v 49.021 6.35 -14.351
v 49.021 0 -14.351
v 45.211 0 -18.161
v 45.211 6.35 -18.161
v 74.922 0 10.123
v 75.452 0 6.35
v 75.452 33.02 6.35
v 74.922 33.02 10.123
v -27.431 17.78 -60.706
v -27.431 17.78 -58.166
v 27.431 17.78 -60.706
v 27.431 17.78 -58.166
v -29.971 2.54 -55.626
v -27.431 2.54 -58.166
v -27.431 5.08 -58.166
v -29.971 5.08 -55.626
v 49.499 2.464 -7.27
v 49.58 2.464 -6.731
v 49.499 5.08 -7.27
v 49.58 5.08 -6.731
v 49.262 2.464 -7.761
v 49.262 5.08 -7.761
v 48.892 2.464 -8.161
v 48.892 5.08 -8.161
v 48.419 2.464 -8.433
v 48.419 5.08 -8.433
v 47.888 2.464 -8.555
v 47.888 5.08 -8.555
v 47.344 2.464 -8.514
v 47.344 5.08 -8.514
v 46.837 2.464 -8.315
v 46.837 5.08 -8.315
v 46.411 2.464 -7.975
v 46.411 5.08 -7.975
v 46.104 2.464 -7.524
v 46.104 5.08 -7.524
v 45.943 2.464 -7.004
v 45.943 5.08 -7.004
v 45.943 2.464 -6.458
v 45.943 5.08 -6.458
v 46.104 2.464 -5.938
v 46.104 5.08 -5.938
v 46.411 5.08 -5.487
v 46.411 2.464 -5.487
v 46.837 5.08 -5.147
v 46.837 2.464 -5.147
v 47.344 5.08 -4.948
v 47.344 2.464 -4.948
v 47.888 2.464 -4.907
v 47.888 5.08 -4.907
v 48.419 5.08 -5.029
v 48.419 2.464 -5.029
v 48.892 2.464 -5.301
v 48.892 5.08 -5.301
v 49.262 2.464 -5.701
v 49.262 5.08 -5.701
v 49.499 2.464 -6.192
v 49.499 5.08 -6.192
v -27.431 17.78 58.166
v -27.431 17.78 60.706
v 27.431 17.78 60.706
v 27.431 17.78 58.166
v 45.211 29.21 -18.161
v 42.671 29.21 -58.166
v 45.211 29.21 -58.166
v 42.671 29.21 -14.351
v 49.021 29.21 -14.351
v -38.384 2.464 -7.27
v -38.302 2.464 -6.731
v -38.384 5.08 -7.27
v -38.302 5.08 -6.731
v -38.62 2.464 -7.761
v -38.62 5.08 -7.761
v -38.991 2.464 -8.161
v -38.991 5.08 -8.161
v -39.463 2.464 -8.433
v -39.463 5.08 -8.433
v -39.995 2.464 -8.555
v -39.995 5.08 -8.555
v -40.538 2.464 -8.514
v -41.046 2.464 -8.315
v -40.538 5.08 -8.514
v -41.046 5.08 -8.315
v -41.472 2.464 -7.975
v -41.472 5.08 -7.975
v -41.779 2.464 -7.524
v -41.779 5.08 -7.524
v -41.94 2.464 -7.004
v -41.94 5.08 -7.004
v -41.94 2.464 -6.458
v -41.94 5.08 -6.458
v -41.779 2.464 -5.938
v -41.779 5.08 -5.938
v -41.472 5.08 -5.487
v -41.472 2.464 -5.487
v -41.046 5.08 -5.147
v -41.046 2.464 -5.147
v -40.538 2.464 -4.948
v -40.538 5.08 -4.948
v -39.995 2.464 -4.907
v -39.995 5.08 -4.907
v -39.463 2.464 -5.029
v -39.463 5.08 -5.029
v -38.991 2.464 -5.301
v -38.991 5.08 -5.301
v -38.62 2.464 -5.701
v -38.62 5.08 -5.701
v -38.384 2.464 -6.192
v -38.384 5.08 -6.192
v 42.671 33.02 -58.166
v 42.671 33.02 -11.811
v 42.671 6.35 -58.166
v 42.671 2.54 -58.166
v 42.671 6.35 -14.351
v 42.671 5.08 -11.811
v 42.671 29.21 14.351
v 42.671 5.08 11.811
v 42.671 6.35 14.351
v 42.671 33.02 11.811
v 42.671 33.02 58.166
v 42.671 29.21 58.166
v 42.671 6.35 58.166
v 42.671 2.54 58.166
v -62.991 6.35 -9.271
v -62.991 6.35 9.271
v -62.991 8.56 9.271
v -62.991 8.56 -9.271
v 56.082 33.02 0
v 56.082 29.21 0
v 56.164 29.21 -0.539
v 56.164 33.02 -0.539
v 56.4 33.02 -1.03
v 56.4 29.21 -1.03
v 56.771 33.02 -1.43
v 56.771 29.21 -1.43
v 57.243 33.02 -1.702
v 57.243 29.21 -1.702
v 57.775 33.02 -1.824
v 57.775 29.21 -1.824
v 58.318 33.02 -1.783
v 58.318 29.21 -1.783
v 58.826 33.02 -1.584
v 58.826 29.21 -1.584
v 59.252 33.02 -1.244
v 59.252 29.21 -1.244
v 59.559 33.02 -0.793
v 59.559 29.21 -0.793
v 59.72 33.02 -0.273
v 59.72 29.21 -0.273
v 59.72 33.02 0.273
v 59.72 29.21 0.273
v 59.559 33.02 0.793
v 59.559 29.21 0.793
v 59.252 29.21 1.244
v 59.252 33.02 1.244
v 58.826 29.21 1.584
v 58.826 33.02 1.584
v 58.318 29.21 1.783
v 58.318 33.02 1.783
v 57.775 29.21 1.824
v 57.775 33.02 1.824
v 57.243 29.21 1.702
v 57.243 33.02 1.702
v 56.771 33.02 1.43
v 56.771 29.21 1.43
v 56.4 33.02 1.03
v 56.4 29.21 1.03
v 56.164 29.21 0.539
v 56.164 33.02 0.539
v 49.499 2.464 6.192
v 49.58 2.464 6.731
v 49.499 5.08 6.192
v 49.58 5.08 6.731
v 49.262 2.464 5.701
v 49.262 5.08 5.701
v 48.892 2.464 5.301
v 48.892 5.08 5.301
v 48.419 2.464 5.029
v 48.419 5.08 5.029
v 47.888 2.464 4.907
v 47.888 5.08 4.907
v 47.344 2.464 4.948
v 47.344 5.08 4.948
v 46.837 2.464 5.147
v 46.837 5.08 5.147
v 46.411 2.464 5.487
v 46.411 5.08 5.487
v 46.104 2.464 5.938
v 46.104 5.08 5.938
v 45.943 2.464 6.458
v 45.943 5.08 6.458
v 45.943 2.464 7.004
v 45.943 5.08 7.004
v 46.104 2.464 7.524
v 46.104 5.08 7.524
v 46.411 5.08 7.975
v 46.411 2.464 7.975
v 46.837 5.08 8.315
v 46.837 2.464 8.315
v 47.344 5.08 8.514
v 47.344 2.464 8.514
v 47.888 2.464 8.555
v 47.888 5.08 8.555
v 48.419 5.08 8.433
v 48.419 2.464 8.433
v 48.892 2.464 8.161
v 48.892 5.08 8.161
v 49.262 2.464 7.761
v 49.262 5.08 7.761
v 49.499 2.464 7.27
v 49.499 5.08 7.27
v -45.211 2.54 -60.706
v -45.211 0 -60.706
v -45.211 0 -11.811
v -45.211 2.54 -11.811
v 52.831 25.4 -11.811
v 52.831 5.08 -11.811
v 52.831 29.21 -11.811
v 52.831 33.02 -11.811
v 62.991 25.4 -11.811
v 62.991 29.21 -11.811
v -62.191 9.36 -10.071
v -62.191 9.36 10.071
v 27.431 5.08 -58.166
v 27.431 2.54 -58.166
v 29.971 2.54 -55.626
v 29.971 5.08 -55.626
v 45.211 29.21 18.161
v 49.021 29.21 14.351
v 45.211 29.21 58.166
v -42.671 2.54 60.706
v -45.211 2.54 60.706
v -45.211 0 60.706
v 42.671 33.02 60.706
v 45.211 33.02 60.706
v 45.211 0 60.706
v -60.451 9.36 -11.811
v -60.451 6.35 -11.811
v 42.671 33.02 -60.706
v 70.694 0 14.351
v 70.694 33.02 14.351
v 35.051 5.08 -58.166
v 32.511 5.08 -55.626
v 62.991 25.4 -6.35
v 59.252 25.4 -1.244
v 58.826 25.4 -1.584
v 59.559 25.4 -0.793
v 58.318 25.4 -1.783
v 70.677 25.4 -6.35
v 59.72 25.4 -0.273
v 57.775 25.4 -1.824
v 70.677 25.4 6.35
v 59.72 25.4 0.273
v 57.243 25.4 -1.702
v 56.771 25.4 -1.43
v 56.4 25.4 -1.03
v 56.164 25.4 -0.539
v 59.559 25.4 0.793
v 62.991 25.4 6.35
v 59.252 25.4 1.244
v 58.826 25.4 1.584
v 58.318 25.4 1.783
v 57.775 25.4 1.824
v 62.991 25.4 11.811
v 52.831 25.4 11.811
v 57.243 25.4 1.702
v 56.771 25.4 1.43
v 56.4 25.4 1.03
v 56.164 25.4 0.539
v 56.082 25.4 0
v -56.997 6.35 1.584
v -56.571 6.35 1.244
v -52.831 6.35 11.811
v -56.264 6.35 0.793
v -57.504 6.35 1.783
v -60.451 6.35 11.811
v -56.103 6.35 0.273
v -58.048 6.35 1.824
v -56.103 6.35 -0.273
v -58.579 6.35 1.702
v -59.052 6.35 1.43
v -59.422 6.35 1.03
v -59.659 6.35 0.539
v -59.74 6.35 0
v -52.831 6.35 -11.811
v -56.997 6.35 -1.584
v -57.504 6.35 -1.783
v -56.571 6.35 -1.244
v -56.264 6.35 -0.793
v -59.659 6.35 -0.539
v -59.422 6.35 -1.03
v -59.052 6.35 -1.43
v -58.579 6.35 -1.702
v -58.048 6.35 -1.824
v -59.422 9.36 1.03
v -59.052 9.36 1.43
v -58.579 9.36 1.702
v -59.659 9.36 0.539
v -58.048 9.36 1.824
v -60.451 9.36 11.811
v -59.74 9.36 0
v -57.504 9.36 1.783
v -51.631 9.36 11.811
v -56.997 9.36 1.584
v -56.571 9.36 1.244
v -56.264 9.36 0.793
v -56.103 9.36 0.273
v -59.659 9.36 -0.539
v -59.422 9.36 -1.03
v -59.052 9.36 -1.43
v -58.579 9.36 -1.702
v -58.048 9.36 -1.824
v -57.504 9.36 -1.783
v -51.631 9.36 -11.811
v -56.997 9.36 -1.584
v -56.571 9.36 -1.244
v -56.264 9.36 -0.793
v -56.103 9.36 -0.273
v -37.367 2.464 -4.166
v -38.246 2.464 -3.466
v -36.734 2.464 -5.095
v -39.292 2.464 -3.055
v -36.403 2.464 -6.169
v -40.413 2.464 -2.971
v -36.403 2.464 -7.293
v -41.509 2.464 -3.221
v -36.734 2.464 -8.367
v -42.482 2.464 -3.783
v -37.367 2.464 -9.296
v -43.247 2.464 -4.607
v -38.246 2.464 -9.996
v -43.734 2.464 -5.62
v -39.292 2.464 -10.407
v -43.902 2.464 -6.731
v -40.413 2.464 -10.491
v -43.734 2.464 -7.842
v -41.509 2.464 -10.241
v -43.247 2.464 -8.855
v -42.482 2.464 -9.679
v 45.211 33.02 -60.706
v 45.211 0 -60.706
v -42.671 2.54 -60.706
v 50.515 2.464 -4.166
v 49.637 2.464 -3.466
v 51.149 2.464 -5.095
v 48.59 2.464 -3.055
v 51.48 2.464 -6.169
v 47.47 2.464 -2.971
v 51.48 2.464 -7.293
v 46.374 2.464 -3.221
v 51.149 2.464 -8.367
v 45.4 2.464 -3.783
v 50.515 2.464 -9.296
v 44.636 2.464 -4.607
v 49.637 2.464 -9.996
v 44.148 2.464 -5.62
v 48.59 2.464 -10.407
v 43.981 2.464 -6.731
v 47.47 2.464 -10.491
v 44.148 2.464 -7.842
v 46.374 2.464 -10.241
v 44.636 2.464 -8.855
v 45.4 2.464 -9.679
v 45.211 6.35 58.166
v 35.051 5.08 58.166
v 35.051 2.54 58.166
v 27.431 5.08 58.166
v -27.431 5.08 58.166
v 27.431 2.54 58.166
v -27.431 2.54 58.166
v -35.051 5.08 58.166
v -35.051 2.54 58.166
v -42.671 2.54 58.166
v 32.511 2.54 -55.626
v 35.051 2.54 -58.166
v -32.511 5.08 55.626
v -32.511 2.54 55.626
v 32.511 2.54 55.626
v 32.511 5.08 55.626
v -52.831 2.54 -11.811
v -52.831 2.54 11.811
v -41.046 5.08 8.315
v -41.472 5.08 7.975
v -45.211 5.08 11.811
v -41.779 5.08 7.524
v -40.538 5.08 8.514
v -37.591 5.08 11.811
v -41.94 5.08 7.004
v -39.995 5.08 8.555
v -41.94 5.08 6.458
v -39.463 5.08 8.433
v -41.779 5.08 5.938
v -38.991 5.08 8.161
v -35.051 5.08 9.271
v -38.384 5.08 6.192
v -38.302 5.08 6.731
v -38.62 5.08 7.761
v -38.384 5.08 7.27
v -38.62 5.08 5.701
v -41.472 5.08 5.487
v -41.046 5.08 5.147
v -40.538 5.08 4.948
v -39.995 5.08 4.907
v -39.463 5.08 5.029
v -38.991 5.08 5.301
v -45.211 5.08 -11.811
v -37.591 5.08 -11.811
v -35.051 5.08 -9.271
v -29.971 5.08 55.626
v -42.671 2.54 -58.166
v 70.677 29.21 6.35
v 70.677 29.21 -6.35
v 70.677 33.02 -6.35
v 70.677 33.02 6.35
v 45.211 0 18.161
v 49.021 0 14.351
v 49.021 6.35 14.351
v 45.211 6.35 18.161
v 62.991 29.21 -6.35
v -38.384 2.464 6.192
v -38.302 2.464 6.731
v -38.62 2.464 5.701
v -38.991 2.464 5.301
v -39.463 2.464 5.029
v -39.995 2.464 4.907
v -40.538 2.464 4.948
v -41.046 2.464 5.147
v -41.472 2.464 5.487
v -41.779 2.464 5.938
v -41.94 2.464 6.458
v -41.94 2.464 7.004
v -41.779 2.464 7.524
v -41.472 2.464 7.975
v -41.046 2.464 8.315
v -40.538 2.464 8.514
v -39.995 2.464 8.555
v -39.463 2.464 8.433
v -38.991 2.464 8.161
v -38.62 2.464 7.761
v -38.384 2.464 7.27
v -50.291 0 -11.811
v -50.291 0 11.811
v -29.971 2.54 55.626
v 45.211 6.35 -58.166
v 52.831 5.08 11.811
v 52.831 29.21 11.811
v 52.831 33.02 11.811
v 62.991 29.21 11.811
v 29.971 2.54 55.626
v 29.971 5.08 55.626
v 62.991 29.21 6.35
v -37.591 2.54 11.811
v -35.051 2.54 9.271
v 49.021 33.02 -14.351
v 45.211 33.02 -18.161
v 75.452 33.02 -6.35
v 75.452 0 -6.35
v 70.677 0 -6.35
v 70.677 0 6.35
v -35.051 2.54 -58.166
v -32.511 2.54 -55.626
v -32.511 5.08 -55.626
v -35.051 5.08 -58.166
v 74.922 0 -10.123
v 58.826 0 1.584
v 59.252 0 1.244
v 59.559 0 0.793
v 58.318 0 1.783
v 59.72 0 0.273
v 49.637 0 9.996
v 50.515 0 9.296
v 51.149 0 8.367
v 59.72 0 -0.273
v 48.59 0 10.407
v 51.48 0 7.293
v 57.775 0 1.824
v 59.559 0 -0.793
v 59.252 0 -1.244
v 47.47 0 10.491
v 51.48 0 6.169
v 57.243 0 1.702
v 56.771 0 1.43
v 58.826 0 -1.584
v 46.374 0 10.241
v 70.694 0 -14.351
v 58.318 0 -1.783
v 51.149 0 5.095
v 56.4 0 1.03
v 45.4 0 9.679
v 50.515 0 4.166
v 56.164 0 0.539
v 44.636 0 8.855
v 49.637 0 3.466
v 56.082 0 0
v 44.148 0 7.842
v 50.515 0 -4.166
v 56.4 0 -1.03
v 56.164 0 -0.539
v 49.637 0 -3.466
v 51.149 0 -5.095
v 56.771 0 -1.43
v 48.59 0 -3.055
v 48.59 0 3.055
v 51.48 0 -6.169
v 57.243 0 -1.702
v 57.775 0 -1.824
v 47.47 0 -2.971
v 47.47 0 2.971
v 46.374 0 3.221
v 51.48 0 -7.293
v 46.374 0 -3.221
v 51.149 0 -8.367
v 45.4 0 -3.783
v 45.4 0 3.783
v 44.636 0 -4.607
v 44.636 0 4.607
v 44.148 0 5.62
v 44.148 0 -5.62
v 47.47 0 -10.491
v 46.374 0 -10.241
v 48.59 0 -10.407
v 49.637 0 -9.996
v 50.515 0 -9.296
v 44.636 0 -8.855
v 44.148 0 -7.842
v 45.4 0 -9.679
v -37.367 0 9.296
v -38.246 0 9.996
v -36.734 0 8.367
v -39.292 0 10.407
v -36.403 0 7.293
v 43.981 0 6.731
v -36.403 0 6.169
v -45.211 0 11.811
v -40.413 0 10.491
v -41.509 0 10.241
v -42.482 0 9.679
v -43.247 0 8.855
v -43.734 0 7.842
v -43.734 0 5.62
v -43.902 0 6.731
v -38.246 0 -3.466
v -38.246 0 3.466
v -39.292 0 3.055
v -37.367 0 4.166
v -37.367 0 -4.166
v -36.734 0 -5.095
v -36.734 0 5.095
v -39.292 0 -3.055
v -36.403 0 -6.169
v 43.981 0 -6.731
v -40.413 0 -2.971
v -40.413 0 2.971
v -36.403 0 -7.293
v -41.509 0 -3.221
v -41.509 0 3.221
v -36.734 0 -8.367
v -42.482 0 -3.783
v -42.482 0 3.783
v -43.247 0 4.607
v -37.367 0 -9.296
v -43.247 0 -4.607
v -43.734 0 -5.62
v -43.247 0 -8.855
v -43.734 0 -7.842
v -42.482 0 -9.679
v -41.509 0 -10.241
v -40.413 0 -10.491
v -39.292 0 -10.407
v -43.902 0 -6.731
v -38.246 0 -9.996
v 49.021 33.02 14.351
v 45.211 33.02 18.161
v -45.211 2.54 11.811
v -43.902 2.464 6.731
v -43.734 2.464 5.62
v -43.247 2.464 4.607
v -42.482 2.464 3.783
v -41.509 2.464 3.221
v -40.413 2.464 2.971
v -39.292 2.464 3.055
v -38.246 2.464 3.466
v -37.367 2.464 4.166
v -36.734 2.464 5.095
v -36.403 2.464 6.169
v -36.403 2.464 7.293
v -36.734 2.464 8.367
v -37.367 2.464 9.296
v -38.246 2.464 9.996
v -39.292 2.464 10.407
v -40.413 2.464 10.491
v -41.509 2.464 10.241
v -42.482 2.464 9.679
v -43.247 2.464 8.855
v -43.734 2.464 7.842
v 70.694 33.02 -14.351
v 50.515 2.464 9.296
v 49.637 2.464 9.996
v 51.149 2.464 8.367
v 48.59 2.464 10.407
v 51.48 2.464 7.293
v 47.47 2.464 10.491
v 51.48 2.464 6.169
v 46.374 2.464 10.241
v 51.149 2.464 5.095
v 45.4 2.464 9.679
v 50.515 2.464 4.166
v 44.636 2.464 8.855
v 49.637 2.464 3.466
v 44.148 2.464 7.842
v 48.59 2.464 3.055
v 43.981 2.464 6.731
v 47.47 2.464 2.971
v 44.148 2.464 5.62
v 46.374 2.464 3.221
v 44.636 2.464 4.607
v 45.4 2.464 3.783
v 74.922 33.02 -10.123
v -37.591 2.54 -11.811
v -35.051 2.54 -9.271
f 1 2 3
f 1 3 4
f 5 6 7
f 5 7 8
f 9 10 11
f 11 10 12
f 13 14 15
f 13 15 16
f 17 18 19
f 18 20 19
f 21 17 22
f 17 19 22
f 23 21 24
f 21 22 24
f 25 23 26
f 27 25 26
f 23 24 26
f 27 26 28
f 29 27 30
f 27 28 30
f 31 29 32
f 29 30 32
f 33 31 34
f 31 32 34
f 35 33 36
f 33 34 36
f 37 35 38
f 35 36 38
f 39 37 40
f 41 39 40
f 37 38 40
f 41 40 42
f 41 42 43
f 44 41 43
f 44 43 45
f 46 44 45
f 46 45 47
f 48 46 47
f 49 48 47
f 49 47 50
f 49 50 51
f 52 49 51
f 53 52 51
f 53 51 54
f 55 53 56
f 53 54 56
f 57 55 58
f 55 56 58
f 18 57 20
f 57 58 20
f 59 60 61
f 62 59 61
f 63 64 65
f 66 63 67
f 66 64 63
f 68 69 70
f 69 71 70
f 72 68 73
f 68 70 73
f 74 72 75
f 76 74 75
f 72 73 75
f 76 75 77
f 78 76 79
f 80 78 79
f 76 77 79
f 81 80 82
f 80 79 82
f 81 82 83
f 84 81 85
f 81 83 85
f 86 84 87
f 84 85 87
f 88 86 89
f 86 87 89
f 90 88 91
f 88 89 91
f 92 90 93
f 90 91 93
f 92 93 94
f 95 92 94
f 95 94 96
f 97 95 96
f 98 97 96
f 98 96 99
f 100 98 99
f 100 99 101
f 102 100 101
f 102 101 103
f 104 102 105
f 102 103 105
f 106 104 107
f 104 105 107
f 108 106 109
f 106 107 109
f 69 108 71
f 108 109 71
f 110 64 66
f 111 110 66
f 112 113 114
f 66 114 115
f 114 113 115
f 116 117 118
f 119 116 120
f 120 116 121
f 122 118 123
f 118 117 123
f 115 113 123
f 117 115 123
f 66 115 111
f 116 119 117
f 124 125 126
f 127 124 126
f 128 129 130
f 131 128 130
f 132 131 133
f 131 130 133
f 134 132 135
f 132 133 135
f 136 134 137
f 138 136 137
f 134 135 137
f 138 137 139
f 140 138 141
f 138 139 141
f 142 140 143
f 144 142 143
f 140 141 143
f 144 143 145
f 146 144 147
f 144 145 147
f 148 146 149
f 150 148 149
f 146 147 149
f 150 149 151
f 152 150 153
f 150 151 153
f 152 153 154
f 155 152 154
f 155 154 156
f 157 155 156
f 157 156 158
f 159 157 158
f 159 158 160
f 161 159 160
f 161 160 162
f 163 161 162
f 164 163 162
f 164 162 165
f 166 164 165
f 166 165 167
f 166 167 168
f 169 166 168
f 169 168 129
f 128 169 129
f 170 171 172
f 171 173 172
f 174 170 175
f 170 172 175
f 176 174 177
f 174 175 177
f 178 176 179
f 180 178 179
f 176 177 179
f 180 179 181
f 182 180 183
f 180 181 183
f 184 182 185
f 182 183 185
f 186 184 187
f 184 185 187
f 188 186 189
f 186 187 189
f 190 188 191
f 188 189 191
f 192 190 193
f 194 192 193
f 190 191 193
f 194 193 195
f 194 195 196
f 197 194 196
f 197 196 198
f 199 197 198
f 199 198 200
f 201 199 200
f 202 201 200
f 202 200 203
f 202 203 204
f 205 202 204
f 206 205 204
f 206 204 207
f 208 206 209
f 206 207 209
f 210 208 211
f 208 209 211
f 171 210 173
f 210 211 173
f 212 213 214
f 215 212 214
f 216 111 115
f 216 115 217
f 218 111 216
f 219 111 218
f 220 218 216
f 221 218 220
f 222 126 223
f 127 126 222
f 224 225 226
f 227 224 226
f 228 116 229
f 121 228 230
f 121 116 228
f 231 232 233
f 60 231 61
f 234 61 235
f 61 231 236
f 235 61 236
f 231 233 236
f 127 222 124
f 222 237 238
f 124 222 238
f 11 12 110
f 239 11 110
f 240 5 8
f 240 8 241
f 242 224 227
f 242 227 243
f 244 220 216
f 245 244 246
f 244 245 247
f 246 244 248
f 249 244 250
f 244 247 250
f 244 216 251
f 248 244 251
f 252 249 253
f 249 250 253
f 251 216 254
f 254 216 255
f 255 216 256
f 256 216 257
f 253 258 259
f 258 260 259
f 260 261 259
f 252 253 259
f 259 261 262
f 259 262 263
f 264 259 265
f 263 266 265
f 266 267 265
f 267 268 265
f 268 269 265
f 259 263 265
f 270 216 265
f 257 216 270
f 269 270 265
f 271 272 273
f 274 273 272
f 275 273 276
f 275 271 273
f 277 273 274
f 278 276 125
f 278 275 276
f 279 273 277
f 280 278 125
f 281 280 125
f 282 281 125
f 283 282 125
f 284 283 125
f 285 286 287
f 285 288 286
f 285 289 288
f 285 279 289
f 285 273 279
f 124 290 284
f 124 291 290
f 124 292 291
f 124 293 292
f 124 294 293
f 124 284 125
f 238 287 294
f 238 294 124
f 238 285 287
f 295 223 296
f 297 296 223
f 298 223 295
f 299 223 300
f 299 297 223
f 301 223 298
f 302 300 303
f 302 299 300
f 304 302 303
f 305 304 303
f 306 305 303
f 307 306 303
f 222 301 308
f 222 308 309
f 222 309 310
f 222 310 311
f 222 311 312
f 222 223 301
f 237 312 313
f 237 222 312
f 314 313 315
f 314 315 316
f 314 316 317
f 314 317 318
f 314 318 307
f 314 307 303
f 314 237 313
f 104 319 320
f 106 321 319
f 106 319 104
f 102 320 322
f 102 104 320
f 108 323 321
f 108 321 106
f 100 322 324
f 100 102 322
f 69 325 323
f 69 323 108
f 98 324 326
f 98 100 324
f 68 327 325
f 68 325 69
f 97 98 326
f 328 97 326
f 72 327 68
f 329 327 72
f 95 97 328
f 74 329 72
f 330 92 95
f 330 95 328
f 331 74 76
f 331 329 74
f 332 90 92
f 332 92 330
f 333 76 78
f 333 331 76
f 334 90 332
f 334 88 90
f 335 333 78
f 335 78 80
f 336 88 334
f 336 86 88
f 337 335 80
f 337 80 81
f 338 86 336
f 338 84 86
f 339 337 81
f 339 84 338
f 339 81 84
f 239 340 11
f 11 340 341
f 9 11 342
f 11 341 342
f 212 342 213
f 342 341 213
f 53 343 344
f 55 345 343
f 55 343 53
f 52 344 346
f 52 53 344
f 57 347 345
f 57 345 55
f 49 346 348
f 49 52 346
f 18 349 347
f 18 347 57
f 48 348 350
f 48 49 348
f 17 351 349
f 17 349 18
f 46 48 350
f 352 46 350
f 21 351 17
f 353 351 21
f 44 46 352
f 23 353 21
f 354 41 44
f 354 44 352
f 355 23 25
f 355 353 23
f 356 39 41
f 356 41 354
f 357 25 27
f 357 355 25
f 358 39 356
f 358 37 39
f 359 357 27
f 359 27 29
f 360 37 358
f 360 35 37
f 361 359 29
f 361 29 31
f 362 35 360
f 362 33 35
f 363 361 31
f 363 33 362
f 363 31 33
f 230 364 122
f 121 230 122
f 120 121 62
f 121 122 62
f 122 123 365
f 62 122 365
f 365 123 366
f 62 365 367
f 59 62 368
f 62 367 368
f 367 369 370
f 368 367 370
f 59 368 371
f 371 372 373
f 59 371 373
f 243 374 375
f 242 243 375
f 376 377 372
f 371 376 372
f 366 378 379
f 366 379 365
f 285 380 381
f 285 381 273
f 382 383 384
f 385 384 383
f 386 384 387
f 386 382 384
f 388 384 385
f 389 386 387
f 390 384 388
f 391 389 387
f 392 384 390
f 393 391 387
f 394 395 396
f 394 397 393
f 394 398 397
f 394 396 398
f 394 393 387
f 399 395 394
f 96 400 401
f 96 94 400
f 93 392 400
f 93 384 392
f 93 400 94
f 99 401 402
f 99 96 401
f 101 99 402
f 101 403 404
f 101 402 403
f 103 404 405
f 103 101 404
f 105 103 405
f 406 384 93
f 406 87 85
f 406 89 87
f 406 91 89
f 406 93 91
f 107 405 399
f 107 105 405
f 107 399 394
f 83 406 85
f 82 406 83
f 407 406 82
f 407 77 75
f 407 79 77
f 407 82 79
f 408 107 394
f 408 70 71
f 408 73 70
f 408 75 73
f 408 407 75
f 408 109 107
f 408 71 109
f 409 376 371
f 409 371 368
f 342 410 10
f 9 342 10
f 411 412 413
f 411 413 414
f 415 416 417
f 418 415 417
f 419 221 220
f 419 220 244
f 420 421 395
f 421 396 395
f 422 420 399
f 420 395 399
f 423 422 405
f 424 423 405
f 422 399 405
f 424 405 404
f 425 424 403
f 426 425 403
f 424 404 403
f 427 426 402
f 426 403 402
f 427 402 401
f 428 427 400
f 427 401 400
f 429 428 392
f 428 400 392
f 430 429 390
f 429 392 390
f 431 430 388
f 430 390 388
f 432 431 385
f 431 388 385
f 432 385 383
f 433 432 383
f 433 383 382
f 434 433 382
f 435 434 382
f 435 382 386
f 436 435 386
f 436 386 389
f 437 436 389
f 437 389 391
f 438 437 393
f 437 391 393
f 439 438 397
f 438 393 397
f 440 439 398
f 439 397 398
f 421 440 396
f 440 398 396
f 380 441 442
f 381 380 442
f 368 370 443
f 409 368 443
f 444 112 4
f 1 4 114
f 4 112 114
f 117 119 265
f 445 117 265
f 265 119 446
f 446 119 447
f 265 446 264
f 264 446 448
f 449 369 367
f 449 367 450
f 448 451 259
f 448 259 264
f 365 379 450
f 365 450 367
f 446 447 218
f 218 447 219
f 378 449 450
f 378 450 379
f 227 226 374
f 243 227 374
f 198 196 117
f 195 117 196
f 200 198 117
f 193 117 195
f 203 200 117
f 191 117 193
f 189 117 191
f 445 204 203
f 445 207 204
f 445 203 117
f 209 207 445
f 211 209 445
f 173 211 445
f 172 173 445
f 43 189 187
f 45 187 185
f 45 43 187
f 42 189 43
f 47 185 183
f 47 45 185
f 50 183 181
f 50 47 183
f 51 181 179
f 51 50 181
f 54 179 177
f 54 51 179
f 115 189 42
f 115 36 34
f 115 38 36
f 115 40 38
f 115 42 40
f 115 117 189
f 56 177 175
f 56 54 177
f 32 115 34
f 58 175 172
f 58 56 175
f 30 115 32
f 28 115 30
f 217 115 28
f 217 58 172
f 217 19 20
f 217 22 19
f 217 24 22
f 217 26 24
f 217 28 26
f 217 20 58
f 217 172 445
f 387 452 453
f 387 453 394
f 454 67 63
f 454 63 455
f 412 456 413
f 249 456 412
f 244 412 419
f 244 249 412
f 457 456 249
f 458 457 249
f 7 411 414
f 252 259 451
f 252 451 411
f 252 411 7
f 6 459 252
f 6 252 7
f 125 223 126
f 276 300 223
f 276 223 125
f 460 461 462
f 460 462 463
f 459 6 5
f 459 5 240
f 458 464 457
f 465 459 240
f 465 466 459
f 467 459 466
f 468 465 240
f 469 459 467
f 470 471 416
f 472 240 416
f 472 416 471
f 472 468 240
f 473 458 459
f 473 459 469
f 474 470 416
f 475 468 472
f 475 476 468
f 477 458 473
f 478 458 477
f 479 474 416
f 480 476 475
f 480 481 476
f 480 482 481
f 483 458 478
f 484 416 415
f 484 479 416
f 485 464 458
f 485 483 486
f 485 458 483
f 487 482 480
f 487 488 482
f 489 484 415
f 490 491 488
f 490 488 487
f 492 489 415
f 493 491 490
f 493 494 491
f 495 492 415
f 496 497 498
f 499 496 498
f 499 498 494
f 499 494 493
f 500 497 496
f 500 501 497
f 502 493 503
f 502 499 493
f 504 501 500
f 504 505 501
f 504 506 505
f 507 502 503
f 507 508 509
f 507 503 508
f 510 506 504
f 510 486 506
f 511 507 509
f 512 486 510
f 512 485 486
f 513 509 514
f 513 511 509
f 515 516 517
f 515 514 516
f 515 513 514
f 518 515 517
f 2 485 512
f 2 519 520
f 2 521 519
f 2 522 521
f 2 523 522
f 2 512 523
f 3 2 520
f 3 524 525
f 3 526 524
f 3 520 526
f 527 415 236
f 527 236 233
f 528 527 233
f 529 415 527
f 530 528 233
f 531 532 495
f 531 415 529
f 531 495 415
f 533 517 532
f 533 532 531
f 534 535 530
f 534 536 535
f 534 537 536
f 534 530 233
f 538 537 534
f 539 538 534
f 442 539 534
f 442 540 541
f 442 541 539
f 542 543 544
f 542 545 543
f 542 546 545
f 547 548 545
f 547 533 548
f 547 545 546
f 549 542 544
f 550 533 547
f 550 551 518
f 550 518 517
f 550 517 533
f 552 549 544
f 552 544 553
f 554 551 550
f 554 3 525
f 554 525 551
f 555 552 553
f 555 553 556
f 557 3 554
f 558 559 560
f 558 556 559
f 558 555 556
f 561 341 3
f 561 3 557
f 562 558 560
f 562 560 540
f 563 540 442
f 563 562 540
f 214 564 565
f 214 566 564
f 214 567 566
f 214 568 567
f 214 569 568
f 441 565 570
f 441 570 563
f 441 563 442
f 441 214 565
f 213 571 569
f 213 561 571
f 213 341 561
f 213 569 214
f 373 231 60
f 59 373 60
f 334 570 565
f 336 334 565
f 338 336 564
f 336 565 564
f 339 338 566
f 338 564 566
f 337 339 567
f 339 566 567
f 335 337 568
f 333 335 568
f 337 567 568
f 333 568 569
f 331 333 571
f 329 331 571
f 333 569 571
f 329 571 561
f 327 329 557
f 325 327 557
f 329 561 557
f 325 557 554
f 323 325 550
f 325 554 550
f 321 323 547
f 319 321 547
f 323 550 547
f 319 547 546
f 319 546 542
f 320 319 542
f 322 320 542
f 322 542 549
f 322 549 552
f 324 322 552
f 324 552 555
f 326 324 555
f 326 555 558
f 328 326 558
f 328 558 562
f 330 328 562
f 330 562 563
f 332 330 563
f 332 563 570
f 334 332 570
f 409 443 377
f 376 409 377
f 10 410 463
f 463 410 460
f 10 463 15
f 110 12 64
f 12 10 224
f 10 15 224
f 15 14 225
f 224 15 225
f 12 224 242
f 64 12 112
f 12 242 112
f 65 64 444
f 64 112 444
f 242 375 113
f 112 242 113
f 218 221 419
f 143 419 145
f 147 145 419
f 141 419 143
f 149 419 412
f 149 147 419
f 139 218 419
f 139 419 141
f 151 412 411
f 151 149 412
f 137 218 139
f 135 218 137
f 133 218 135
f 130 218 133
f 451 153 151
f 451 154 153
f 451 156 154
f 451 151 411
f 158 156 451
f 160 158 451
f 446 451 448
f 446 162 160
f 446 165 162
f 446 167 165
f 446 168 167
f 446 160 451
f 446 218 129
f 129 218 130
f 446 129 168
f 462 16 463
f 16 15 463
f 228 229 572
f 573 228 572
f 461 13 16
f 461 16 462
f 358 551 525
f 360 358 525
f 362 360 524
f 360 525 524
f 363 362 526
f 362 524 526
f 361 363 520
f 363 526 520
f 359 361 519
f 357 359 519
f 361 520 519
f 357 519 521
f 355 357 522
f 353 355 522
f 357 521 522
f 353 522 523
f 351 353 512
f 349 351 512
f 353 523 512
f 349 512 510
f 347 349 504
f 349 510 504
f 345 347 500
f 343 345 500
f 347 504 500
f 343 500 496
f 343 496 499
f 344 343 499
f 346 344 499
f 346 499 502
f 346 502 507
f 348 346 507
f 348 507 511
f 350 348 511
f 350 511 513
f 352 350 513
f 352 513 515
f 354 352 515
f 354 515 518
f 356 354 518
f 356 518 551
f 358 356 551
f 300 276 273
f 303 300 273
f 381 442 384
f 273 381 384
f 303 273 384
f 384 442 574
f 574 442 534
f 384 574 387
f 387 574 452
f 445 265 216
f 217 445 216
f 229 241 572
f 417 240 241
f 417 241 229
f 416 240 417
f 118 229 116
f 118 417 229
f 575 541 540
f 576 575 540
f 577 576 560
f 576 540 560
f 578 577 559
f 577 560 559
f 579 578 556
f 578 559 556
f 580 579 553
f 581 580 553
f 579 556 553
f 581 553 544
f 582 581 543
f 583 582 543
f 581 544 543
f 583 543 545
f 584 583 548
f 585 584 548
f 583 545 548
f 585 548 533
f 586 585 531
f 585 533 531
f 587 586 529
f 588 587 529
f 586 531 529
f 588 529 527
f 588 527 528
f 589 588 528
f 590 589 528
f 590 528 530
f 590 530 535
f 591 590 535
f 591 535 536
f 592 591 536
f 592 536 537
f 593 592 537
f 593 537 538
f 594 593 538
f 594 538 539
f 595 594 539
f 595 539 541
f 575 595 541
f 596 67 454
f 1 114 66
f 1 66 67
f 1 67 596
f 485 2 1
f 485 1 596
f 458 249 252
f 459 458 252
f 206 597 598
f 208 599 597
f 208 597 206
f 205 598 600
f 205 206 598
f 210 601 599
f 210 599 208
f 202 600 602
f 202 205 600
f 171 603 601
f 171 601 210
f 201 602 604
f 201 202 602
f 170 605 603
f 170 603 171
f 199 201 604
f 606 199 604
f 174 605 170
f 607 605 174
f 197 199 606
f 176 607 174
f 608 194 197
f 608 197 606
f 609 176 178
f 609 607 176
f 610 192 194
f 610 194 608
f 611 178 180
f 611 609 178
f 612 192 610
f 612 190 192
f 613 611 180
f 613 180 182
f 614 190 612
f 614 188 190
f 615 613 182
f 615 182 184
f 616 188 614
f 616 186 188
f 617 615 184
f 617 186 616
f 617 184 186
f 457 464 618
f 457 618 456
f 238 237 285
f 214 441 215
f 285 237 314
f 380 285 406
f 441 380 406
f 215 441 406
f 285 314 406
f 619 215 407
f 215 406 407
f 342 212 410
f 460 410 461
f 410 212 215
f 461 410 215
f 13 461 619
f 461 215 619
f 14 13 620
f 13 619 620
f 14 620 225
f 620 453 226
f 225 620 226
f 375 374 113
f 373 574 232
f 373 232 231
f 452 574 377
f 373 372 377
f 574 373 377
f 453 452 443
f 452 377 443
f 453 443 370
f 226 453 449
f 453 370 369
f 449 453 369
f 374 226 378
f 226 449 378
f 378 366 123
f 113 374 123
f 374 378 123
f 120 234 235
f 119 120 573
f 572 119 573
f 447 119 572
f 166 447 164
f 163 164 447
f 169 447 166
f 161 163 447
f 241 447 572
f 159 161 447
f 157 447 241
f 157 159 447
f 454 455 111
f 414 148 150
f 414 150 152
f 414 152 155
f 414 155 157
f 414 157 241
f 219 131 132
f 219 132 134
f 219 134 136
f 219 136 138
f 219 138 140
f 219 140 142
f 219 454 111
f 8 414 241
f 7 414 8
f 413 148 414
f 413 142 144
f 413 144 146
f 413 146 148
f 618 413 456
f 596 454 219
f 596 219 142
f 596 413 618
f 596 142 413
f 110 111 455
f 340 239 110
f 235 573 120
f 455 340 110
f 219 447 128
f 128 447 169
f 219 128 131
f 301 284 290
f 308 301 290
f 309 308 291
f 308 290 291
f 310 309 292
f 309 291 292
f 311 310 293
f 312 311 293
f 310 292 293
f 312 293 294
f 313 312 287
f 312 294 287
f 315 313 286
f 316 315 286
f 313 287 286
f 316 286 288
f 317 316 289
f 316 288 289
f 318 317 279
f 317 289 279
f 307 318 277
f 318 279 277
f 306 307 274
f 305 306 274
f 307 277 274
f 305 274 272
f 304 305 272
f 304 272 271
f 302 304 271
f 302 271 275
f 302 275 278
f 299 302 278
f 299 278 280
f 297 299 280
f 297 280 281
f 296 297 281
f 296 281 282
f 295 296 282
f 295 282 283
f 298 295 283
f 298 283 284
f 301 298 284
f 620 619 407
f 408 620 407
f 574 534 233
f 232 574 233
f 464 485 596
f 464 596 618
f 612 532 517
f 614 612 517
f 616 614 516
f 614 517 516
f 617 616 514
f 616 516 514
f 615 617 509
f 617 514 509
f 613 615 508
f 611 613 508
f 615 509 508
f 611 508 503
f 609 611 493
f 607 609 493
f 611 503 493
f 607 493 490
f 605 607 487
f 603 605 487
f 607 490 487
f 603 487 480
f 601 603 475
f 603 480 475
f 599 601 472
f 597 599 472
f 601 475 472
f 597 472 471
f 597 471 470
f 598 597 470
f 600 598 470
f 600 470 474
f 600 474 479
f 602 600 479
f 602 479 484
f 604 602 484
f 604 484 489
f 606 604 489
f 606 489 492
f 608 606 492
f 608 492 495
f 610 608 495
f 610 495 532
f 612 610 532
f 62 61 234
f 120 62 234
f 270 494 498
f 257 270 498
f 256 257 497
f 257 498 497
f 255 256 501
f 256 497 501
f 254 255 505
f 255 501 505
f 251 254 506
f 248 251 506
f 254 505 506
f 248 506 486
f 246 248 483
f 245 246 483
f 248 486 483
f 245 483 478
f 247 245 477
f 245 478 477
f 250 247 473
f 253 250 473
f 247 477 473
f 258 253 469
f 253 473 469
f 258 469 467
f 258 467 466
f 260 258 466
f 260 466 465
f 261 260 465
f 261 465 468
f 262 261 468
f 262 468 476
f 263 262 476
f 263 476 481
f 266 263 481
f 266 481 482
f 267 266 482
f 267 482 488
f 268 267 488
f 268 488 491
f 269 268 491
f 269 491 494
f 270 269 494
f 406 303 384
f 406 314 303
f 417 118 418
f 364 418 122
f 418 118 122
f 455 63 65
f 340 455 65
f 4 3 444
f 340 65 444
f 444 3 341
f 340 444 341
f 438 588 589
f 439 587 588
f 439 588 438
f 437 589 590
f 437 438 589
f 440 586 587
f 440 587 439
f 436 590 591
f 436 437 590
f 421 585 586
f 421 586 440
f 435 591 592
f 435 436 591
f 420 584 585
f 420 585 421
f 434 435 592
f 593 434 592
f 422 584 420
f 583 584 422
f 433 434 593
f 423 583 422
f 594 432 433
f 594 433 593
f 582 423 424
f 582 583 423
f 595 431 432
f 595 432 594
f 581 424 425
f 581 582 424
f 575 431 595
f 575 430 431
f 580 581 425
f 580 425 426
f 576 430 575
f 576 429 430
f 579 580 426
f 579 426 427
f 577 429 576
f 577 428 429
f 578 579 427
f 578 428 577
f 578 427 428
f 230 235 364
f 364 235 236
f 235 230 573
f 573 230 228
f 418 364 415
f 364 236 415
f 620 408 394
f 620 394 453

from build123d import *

# Parameters (mm, degrees)
SKETCH3_W                                       = 90.422573022
SKETCH3_H                                       = 121.412
BOSS_EXTRUDE4_DEPTH                             = 2.54
BOSS_EXTRUDE5_DEPTH                             = 30.48
CUT_EXTRUDE2_DEPTH                              = 122.412
BOSS_EXTRUDE6_DEPTH                             = 33.02
SKETCH9_W                                       = 10.16
SKETCH9_H                                       = 23.622
CUT_EXTRUDE3_DEPTH                              = 27.94
BOSS_EXTRUDE7_DEPTH                             = 2.54
SKETCH12_W                                      = 23.622
SKETCH12_H                                      = 3.81
CUT_EXTRUDE4_DEPTH                              = 10.16
SKETCH13_W                                      = 12.7
SKETCH13_H                                      = 3.81
CUT_EXTRUDE5_DEPTH                              = 13.461069207
BOSS_EXTRUDE9_REACH                             = 62.706
BOSS_EXTRUDE9_DIRECTION_2_REACH                 = 62.706
CBORE_FOR_6_PAN_HEAD_MACHINE_SCREW1_D           = 3.6576
CBORE_FOR_6_PAN_HEAD_MACHINE_SCREW1_CBORE_D     = 7.54126
CBORE_FOR_6_PAN_HEAD_MACHINE_SCREW1_CBORE_DEPTH = 2.4638
F_6_CLEARANCE_HOLE1_D                           = 3.6576
SKETCH21_W                                      = 43.815
SKETCH21_H                                      = 22.86
CUT_EXTRUDE6_DEPTH                              = 33.781069207
CHAMFER1_SIZE                                   = 2.54
CHAMFER2_SIZE                                   = 3.81
SKETCH22_W                                      = 17.78
SKETCH22_H                                      = 23.622
CUT_EXTRUDE7_DEPTH                              = 0.8
CHAMFER3_SIZE                                   = 0.8


with BuildPart() as part:
    # Sketch3 → Boss-Extrude4 (new body)
    with BuildSketch(Plane(origin=(0, 0, 0), x_dir=(1, 0, 0), z_dir=(0, 1, 0))):
        Rectangle(SKETCH3_W, SKETCH3_H)
    extrude(amount=BOSS_EXTRUDE4_DEPTH)

    # Sketch6 → Boss-Extrude5 (add)
    with BuildSketch(Plane(origin=(0, 2.54, 0), x_dir=(1, 0, 0), z_dir=(0, 1, 0))):
        Polygon((45.211286511, -60.706), (45.211286511, 60.706), (-45.211286511, 60.706), (-45.211286511, 58.166), (42.671286511, 58.166), (42.671286511, -58.166), (-45.211286511, -58.166), (-45.211286511, -60.706), align=None)
    extrude(amount=BOSS_EXTRUDE5_DEPTH)

    # Sketch7 → Cut-Extrude2 (cut, through all)
    with BuildSketch(Plane.XY.offset(60.706)):
        Polygon((-42.671286511, 2.54), (-27.431286511, 17.78), (27.431286511, 17.78), (42.671286511, 33.02), (-45.211286511, 33.02), (-45.211286511, 2.54), align=None)
    extrude(amount=-CUT_EXTRUDE2_DEPTH, mode=Mode.SUBTRACT)

    # Sketch8 → Boss-Extrude6 (add)
    with BuildSketch(Plane(origin=(0, 0, 0), x_dir=(1, 0, 0), z_dir=(0, 1, 0))):
        Polygon((45.211286511, 14.351), (70.694027546, 14.351), (74.922106204, 10.122921342), (75.452355719, 6.35), (70.677155719, 6.35), (70.677155719, -6.35), (75.452355719, -6.35), (74.922106204, -10.122921342), (70.694027546, -14.351), (45.211286511, -14.351), align=None)
    extrude(amount=BOSS_EXTRUDE6_DEPTH)

    # Sketch9 → Cut-Extrude3 (cut)
    with BuildSketch(Plane(origin=(0, 33.02, 0), x_dir=(1, 0, 0), z_dir=(0, 1, 0))):
        with Locations((47.751286511, 0)):
            Rectangle(SKETCH9_W, SKETCH9_H)
    extrude(amount=-CUT_EXTRUDE3_DEPTH, mode=Mode.SUBTRACT)

    # Sketch11 → Boss-Extrude7 (add)
    with BuildSketch(Plane(origin=(0, 2.54, 0), x_dir=(1, 0, 0), z_dir=(0, 1, 0))):
        Polygon((35.051286511, 58.166), (27.431286511, 58.166), (29.971286511, 55.626), (32.511286511, 55.626), align=None)
        Polygon((-29.971286511, 55.626), (-32.511286511, 55.626), (-35.051286511, 58.166), (-27.431286511, 58.166), align=None)
        Polygon((29.971286511, -55.626), (32.511286511, -55.626), (35.051286511, -58.166), (27.431286511, -58.166), align=None)
        Polygon((-27.431286511, -58.166), (-29.971286511, -55.626), (-32.511286511, -55.626), (-35.051286511, -58.166), align=None)
    extrude(amount=BOSS_EXTRUDE7_DEPTH)

    # Sketch12 → Cut-Extrude4 (cut)
    with BuildSketch(Plane.ZY.offset(-52.831286511)):
        with Locations((0, 27.305)):
            Rectangle(SKETCH12_W, SKETCH12_H)
    extrude(amount=-CUT_EXTRUDE4_DEPTH, mode=Mode.SUBTRACT)

    # Sketch13 → Cut-Extrude5 (cut, through all)
    with BuildSketch(Plane.ZY.offset(-62.991286511)):
        with Locations((0, 27.305)):
            Rectangle(SKETCH13_W, SKETCH13_H)
    extrude(amount=-CUT_EXTRUDE5_DEPTH, mode=Mode.SUBTRACT)

    # Boss-Extrude9: up to this face of the body (flat: up to its plane)
    boss_extrude9_end = Plane(part.part.faces().sort_by_distance((48.970486511, 20.0406, -11.811))[0])
    # Sketch15 → Boss-Extrude9 (add, up to the picked face)
    with BuildSketch(Plane.XY, mode=Mode.PRIVATE) as boss_extrude9_sk1:
        Polygon((-62.991286511, 10.16), (-52.831286511, 10.16), (-45.211286511, 5.08), (-35.051286511, 5.08), (-35.051286511, 2.54), (-45.211286511, 2.54), (-45.211286511, 0), (-52.831286511, 0), (-52.831286511, 6.35), (-62.991286511, 6.35), align=None)
    boss_extrude9_tool1 = split(extrude(boss_extrude9_sk1.sketch, amount=-BOSS_EXTRUDE9_REACH, mode=Mode.PRIVATE), bisect_by=boss_extrude9_end, keep=Keep.BOTH, mode=Mode.PRIVATE)
    add(boss_extrude9_tool1.solids().sort_by_distance((-50.157602, 5.280526, 0))[0])

    # Boss-Extrude9 direction 2: up to this face of the body (flat: up to its plane)
    boss_extrude9_direction_2_end = Plane(part.part.faces().sort_by_distance((48.970486511, 20.0406, 11.811))[0])
    # Sketch15 → Boss-Extrude9 direction 2 (add, up to the picked face)
    with BuildSketch(Plane.XY, mode=Mode.PRIVATE) as boss_extrude9_direction_2_sk1:
        Polygon((-62.991286511, 10.16), (-52.831286511, 10.16), (-45.211286511, 5.08), (-35.051286511, 5.08), (-35.051286511, 2.54), (-45.211286511, 2.54), (-45.211286511, 0), (-52.831286511, 0), (-52.831286511, 6.35), (-62.991286511, 6.35), align=None)
    boss_extrude9_direction_2_tool1 = split(extrude(boss_extrude9_direction_2_sk1.sketch, amount=BOSS_EXTRUDE9_DIRECTION_2_REACH, mode=Mode.PRIVATE), bisect_by=boss_extrude9_direction_2_end, keep=Keep.BOTH, mode=Mode.PRIVATE)
    add(boss_extrude9_direction_2_tool1.solids().sort_by_distance((-50.157602, 5.280526, 0))[0])

    # CBORE for #6 Pan Head Machine Screw1 (through all)
    with Locations(Plane(origin=(0, 0, 0), x_dir=(-1, 0, 0), z_dir=(0, -1, 0))):
        with Locations((-47.751286511, 6.731), (-47.751286511, -6.731), (40.131286511, 6.731), (40.131286511, -6.731)):
            CounterBoreHole(CBORE_FOR_6_PAN_HEAD_MACHINE_SCREW1_D / 2, CBORE_FOR_6_PAN_HEAD_MACHINE_SCREW1_CBORE_D / 2, CBORE_FOR_6_PAN_HEAD_MACHINE_SCREW1_CBORE_DEPTH)

    # #6 Clearance Hole1 (through all)
    with Locations(Plane(origin=(0, 33.02, 0), x_dir=(1, 0, 0), z_dir=(0, 1, 0))):
        with Locations((-57.911286511, 0), (57.911286511, 0)):
            Hole(F_6_CLEARANCE_HOLE1_D / 2)

    # Sketch21 → Cut-Extrude6 (cut, through all)
    with BuildSketch(Plane.ZY.offset(-42.671286511)):
        with Locations((-36.2585, 17.78)):
            Rectangle(SKETCH21_W, SKETCH21_H)
        with Locations((36.2585, 17.78)):
            Rectangle(SKETCH21_W, SKETCH21_H)
    extrude(amount=-CUT_EXTRUDE6_DEPTH, mode=Mode.SUBTRACT)

    # Chamfer1
    chamfer1_edges = [part.edges().sort_by_distance(p)[0] for p in [
        (-52.831286511, 0, 0),
        (-35.051286511, 3.81, -11.811),
        (-62.991286511, 8.255, -11.811),
        (-62.991286511, 8.255, 11.811),
        (-35.051286511, 3.81, 11.811),
    ]]
    chamfer(chamfer1_edges, length=CHAMFER1_SIZE)

    # Chamfer2
    chamfer2_edges = [part.edges().sort_by_distance(p)[0] for p in [
        (45.211286511, 3.175, -14.351),
        (45.211286511, 3.175, 14.351),
        (45.211286511, 31.115, -14.351),
        (45.211286511, 31.115, 14.351),
    ]]
    chamfer(chamfer2_edges, length=CHAMFER2_SIZE)

    # Sketch22 → Cut-Extrude7 (cut)
    with BuildSketch(Plane(origin=(0, 10.16, 0), x_dir=(1, 0, 0), z_dir=(0, 1, 0))):
        with Locations((-54.101286511, 0)):
            Rectangle(SKETCH22_W, SKETCH22_H)
    extrude(amount=-CUT_EXTRUDE7_DEPTH, mode=Mode.SUBTRACT)

    # Chamfer3
    chamfer3_edges = [part.edges().sort_by_distance(p)[0] for p in [
        (-62.991286511, 9.36, 0),
    ]]
    chamfer(chamfer3_edges, length=CHAMFER3_SIZE)


solid = part.part
